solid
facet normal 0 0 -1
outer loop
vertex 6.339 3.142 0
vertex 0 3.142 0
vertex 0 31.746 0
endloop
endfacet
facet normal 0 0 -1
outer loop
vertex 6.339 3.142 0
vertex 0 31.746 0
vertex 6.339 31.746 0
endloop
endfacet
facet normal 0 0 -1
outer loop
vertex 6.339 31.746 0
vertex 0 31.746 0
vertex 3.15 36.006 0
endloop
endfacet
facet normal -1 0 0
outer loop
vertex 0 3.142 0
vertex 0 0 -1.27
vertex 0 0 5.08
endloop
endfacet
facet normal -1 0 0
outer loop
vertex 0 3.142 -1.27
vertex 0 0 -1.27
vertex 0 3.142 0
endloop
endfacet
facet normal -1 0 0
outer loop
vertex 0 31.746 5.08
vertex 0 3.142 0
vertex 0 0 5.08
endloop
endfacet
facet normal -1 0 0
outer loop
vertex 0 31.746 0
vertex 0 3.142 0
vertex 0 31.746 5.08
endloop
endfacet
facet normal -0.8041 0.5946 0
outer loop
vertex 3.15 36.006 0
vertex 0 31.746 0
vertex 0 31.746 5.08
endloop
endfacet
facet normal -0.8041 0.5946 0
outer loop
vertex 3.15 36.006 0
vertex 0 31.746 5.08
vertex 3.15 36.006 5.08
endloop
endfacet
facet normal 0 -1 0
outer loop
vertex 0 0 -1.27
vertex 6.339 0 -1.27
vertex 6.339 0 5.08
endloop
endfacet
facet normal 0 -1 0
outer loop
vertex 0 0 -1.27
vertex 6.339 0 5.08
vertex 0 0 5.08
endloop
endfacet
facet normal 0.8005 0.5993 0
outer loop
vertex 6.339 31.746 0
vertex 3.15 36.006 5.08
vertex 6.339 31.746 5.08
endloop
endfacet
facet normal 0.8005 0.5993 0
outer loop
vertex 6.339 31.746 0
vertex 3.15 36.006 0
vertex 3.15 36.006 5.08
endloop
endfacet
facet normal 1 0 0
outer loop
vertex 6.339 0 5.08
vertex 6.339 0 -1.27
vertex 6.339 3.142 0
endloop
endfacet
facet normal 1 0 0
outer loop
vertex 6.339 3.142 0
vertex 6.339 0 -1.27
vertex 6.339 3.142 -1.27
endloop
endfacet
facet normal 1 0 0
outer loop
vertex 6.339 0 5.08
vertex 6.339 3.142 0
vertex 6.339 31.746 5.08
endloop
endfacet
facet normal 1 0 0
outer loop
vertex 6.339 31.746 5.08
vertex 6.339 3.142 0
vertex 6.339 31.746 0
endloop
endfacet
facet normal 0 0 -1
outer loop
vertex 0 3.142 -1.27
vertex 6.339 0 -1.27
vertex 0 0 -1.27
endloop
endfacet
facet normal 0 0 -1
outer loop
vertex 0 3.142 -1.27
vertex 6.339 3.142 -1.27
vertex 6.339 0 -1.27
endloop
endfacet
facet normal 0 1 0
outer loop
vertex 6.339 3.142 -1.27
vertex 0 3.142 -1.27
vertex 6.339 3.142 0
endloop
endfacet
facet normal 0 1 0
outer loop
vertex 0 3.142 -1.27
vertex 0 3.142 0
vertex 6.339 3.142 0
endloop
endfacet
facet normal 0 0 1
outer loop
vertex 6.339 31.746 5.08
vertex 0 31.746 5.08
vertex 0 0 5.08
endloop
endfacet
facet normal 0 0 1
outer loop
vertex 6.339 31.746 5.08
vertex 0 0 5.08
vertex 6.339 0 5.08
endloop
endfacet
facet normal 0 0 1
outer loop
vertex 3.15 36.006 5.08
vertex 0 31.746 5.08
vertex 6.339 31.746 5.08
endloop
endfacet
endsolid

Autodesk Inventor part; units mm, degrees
ref_plane "YZ Plane" through (0, 0, 0) normal (1, 0, 0) x (0, 1, 0)
ref_plane "XZ Plane" through (0, 0, 0) normal (0, 1, 0) x (-1, 0, 0)
ref_plane "XY Plane" through (0, 0, 0) normal (0, 0, 1) x (1, 0, 0)
sketch "Sketch1" plane through (0, 0, 0) normal (0, 0, 1) x (1, 0, 0)
  line L0 (6.3387, 0) -> (6.3387, 31.7461)
  line L1 (0, 31.7461) -> (3.15, 36.0063)
  line L2 (3.15, 36.0063) -> (6.3387, 31.7461)
  line L3 (6.3387, 0) -> (0, 0)
  line L4 (0, 0) -> (0, 31.7461)
extrude "Extrusion1" add sketch "Sketch1" along normal blind 5.08
sketch "Sketch2" plane through (0, 0, 0) normal (0, 0, -1) x (-1, 0, 0)
  line L0 (0, 0) -> (-6.3387, 0) projected
  line L1 (0, 31.7461) -> (0, 0) projected
  line L2 (-6.3387, 0) -> (0, 0)
  line L3 (0, 0) -> (0, 3.1419)
  line L4 (0, 3.1419) -> (-6.3387, 3.1419)
  line L5 (-6.3387, 3.1419) -> (-6.3387, 0)
extrude "Extrusion2" add sketch "Sketch2" along normal blind 1.27
properties part number "Needle"
